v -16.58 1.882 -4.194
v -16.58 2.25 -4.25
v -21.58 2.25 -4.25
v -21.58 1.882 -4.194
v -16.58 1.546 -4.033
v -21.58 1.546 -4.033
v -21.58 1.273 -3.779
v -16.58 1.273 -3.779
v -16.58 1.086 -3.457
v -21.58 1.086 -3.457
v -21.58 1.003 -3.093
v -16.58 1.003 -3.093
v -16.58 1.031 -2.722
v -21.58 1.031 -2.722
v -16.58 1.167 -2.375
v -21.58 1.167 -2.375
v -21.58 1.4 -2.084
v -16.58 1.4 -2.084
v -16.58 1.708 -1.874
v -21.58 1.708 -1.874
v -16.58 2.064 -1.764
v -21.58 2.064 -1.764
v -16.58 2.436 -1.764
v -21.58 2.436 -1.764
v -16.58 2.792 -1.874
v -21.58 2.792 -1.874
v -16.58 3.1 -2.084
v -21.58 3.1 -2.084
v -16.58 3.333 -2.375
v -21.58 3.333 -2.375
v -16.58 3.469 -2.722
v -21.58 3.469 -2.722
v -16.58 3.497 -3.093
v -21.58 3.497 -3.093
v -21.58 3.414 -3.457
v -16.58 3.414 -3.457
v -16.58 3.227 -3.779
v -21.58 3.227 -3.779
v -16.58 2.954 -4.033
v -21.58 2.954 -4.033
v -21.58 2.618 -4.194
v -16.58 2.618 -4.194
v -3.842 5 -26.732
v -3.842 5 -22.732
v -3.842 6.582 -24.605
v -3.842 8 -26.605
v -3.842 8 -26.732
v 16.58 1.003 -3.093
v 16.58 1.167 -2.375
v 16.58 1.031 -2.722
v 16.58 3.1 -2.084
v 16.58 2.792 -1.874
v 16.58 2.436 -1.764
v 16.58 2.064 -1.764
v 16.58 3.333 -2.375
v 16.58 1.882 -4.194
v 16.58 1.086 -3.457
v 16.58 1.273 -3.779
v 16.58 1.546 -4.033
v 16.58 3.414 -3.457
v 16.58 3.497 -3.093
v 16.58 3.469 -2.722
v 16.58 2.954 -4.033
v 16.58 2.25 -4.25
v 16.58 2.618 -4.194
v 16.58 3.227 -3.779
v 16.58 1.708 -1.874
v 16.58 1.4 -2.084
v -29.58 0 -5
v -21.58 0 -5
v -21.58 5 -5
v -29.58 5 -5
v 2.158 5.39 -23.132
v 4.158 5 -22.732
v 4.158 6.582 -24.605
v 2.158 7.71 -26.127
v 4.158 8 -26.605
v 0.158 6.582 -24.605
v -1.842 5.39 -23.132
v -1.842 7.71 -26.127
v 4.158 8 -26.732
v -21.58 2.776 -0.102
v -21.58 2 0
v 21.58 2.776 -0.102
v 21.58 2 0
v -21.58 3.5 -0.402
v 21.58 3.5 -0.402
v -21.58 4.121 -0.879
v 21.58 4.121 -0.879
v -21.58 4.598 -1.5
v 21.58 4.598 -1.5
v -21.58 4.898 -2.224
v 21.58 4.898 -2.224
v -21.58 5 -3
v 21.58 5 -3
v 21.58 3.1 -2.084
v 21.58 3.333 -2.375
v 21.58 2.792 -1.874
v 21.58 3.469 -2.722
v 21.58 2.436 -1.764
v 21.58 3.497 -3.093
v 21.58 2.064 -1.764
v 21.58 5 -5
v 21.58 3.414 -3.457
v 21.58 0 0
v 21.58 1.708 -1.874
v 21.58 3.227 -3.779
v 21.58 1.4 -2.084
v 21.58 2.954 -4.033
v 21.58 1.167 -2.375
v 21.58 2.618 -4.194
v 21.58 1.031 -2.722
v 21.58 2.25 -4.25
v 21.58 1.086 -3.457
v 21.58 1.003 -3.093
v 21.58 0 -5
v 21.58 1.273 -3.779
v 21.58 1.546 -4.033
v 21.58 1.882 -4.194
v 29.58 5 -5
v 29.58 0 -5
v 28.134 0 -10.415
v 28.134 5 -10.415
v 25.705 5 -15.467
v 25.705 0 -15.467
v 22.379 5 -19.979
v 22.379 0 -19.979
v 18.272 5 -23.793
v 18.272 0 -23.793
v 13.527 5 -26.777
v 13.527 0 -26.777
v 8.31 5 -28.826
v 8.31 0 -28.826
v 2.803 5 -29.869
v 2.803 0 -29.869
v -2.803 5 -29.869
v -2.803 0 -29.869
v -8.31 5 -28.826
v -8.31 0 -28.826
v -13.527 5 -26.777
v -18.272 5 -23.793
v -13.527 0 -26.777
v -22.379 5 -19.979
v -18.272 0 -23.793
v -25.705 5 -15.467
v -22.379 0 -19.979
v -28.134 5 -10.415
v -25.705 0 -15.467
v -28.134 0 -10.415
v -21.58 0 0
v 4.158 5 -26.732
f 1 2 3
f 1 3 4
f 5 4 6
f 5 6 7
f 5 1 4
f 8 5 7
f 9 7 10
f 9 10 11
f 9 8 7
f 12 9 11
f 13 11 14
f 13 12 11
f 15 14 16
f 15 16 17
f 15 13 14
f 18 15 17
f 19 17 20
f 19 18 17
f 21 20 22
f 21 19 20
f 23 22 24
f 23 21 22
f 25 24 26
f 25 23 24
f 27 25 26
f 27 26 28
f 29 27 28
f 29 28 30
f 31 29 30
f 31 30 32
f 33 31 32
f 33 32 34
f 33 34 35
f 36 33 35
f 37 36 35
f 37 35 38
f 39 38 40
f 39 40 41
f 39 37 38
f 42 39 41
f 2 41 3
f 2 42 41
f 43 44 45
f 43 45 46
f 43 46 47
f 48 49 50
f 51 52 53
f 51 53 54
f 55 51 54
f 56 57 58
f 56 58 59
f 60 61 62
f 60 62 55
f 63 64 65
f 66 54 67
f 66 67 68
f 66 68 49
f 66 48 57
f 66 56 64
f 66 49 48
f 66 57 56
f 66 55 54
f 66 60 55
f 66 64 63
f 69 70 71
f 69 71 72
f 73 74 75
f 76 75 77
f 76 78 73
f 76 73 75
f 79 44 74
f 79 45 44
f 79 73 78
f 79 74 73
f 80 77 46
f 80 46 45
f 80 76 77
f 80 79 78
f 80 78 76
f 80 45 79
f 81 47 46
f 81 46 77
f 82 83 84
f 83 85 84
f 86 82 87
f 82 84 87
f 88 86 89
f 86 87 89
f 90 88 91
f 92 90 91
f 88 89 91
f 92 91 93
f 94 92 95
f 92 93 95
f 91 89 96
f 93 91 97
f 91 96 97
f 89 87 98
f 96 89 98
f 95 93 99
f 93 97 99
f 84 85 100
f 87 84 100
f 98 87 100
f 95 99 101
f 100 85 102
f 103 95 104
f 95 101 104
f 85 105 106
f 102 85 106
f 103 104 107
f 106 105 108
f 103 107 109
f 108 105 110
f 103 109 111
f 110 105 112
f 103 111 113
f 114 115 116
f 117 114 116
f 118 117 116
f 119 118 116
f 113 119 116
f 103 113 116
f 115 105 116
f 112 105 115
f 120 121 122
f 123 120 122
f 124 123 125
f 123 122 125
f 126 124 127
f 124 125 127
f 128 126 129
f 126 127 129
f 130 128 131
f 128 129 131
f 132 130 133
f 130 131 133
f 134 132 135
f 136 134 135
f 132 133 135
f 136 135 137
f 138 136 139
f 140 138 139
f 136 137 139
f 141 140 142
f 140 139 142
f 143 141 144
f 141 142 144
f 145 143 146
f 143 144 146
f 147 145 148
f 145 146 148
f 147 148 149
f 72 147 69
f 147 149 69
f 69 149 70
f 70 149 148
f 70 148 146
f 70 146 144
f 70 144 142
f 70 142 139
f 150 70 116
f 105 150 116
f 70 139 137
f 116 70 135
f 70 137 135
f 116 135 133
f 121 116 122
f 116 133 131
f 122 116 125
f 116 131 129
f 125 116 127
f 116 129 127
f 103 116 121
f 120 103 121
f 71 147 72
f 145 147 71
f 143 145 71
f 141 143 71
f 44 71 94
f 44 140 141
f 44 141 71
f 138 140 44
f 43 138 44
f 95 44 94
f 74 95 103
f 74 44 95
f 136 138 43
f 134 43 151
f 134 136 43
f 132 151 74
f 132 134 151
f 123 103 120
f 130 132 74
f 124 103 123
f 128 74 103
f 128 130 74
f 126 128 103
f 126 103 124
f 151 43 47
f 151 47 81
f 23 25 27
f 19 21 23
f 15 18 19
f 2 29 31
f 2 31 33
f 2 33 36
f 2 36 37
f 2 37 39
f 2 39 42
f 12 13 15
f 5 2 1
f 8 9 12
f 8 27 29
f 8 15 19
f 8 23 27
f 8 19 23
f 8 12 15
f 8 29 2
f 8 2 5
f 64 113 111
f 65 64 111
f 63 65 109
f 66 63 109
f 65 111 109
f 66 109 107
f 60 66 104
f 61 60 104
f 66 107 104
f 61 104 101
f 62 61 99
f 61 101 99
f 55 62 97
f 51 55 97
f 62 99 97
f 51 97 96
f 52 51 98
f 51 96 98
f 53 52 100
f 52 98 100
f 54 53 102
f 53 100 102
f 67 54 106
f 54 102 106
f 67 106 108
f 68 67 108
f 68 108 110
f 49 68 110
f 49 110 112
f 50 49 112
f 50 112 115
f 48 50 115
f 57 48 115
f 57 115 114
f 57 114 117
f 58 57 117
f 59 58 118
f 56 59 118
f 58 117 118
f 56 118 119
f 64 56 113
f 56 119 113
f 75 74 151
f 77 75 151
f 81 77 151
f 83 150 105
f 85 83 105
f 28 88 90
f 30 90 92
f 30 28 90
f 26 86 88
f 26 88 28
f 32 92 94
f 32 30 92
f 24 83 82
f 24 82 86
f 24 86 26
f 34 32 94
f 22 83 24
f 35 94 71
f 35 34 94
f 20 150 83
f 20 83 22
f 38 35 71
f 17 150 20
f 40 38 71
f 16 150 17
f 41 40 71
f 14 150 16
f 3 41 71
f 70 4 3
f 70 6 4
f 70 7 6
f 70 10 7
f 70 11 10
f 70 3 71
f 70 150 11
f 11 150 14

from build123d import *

# Parameters (mm, degrees)
BOSS_EXTRUDE1_DEPTH = 5
SKETCH3_W           = 8
SKETCH3_H           = 4
BOSS_EXTRUDE2_DEPTH = 3
FILLET1_START       = -3.841593316
FILLET1_DEPTH       = 8
CUT_EXTRUDE1_START  = -10
CUT_EXTRUDE1_DEPTH  = 10
FILLET2_R           = 3
SKETCH6_R           = 1.25
CUT_EXTRUDE2_DEPTH  = 5
CUT_EXTRUDE3_START  = -5
SKETCH7_R           = 1.25
CUT_EXTRUDE3_DEPTH  = 5


with BuildPart() as part:
    # Sketch1 → Boss-Extrude1 (new body)
    with BuildSketch(Plane(origin=(0, 0, 0), x_dir=(1, 0, 0), z_dir=(0, 1, 0))):
        with BuildLine():
            Line((-30, 0), (30, 0))
            ThreePointArc((30, 0), (0, 30), (-30, 0))
        make_face()
    extrude(amount=BOSS_EXTRUDE1_DEPTH)

    # Sketch3 → Boss-Extrude2 (add)
    with BuildSketch(Plane(origin=(0, 5, 0), x_dir=(1, 0, 0), z_dir=(0, 1, 0))):
        with Locations((0.158406684, 24.731666579)):
            Rectangle(SKETCH3_W, SKETCH3_H)
    extrude(amount=BOSS_EXTRUDE2_DEPTH)

    # Fillet1: read off the stored shape, not the designer's step
    # Fillet1 outline → Fillet1 (cut)
    with BuildSketch(Plane.YZ.offset(FILLET1_START)):
        with BuildLine():
            Line((8, -22.731666579), (5, -22.731666579))
            add(Edge.make_bspline(
                [(5, -22.731666579), (8, -23.506263249), (8, -26.604649926)],
                knots=[0, 0, 0, 1, 1, 1], degree=2, weights=[1, 0.057495957, 1]))
            Line((8, -26.604649926), (8, -22.731666579))
        make_face()
    extrude(amount=FILLET1_DEPTH, mode=Mode.SUBTRACT)

    # Sketch5 → Cut-Extrude1 (cut)
    with BuildSketch(Plane(origin=(0, 5, 0), x_dir=(1, 0, 0), z_dir=(0, 1, 0)).offset(CUT_EXTRUDE1_START)):
        with BuildLine():
            Line((-21.580398915, 0), (-21.580398915, 5))
            Line((-21.580398915, 5), (-29.580398915, 5))
            ThreePointArc((-29.580398915, 5), (-29.894915684, 2.508787808), (-30, 0))
            Line((-30, 0), (-21.580398915, 0))
        make_face()
        with BuildLine():
            Line((21.580398915, 5), (29.580398915, 5))
            ThreePointArc((29.580398915, 5), (29.894915684, 2.508787808), (30, 0))
            Line((30, 0), (21.580398915, 0))
            Line((21.580398915, 0), (21.580398915, 5))
        make_face()
    extrude(amount=CUT_EXTRUDE1_DEPTH, mode=Mode.SUBTRACT)

    # Fillet2
    fillet2_edges = [part.edges().sort_by_distance(p)[0] for p in [
        (0, 5, 0),
    ]]
    fillet(fillet2_edges, radius=FILLET2_R)

    # Sketch6 → Cut-Extrude2 (cut)
    with BuildSketch(Plane(origin=(21.580398915, 0, 0), x_dir=(0, 0, -1), z_dir=(1, 0, 0))):
        with Locations((3, 2.25)):
            Circle(SKETCH6_R)
    extrude(amount=-CUT_EXTRUDE2_DEPTH, mode=Mode.SUBTRACT)

    # Sketch7 → Cut-Extrude3 (cut)
    with BuildSketch(Plane.ZY.offset(21.580398915).offset(CUT_EXTRUDE3_START)):
        with Locations(Location((-3, 2.25, 0), (0, 0, 180))):
            Circle(SKETCH7_R)
    extrude(amount=CUT_EXTRUDE3_DEPTH, mode=Mode.SUBTRACT)


solid = part.part
